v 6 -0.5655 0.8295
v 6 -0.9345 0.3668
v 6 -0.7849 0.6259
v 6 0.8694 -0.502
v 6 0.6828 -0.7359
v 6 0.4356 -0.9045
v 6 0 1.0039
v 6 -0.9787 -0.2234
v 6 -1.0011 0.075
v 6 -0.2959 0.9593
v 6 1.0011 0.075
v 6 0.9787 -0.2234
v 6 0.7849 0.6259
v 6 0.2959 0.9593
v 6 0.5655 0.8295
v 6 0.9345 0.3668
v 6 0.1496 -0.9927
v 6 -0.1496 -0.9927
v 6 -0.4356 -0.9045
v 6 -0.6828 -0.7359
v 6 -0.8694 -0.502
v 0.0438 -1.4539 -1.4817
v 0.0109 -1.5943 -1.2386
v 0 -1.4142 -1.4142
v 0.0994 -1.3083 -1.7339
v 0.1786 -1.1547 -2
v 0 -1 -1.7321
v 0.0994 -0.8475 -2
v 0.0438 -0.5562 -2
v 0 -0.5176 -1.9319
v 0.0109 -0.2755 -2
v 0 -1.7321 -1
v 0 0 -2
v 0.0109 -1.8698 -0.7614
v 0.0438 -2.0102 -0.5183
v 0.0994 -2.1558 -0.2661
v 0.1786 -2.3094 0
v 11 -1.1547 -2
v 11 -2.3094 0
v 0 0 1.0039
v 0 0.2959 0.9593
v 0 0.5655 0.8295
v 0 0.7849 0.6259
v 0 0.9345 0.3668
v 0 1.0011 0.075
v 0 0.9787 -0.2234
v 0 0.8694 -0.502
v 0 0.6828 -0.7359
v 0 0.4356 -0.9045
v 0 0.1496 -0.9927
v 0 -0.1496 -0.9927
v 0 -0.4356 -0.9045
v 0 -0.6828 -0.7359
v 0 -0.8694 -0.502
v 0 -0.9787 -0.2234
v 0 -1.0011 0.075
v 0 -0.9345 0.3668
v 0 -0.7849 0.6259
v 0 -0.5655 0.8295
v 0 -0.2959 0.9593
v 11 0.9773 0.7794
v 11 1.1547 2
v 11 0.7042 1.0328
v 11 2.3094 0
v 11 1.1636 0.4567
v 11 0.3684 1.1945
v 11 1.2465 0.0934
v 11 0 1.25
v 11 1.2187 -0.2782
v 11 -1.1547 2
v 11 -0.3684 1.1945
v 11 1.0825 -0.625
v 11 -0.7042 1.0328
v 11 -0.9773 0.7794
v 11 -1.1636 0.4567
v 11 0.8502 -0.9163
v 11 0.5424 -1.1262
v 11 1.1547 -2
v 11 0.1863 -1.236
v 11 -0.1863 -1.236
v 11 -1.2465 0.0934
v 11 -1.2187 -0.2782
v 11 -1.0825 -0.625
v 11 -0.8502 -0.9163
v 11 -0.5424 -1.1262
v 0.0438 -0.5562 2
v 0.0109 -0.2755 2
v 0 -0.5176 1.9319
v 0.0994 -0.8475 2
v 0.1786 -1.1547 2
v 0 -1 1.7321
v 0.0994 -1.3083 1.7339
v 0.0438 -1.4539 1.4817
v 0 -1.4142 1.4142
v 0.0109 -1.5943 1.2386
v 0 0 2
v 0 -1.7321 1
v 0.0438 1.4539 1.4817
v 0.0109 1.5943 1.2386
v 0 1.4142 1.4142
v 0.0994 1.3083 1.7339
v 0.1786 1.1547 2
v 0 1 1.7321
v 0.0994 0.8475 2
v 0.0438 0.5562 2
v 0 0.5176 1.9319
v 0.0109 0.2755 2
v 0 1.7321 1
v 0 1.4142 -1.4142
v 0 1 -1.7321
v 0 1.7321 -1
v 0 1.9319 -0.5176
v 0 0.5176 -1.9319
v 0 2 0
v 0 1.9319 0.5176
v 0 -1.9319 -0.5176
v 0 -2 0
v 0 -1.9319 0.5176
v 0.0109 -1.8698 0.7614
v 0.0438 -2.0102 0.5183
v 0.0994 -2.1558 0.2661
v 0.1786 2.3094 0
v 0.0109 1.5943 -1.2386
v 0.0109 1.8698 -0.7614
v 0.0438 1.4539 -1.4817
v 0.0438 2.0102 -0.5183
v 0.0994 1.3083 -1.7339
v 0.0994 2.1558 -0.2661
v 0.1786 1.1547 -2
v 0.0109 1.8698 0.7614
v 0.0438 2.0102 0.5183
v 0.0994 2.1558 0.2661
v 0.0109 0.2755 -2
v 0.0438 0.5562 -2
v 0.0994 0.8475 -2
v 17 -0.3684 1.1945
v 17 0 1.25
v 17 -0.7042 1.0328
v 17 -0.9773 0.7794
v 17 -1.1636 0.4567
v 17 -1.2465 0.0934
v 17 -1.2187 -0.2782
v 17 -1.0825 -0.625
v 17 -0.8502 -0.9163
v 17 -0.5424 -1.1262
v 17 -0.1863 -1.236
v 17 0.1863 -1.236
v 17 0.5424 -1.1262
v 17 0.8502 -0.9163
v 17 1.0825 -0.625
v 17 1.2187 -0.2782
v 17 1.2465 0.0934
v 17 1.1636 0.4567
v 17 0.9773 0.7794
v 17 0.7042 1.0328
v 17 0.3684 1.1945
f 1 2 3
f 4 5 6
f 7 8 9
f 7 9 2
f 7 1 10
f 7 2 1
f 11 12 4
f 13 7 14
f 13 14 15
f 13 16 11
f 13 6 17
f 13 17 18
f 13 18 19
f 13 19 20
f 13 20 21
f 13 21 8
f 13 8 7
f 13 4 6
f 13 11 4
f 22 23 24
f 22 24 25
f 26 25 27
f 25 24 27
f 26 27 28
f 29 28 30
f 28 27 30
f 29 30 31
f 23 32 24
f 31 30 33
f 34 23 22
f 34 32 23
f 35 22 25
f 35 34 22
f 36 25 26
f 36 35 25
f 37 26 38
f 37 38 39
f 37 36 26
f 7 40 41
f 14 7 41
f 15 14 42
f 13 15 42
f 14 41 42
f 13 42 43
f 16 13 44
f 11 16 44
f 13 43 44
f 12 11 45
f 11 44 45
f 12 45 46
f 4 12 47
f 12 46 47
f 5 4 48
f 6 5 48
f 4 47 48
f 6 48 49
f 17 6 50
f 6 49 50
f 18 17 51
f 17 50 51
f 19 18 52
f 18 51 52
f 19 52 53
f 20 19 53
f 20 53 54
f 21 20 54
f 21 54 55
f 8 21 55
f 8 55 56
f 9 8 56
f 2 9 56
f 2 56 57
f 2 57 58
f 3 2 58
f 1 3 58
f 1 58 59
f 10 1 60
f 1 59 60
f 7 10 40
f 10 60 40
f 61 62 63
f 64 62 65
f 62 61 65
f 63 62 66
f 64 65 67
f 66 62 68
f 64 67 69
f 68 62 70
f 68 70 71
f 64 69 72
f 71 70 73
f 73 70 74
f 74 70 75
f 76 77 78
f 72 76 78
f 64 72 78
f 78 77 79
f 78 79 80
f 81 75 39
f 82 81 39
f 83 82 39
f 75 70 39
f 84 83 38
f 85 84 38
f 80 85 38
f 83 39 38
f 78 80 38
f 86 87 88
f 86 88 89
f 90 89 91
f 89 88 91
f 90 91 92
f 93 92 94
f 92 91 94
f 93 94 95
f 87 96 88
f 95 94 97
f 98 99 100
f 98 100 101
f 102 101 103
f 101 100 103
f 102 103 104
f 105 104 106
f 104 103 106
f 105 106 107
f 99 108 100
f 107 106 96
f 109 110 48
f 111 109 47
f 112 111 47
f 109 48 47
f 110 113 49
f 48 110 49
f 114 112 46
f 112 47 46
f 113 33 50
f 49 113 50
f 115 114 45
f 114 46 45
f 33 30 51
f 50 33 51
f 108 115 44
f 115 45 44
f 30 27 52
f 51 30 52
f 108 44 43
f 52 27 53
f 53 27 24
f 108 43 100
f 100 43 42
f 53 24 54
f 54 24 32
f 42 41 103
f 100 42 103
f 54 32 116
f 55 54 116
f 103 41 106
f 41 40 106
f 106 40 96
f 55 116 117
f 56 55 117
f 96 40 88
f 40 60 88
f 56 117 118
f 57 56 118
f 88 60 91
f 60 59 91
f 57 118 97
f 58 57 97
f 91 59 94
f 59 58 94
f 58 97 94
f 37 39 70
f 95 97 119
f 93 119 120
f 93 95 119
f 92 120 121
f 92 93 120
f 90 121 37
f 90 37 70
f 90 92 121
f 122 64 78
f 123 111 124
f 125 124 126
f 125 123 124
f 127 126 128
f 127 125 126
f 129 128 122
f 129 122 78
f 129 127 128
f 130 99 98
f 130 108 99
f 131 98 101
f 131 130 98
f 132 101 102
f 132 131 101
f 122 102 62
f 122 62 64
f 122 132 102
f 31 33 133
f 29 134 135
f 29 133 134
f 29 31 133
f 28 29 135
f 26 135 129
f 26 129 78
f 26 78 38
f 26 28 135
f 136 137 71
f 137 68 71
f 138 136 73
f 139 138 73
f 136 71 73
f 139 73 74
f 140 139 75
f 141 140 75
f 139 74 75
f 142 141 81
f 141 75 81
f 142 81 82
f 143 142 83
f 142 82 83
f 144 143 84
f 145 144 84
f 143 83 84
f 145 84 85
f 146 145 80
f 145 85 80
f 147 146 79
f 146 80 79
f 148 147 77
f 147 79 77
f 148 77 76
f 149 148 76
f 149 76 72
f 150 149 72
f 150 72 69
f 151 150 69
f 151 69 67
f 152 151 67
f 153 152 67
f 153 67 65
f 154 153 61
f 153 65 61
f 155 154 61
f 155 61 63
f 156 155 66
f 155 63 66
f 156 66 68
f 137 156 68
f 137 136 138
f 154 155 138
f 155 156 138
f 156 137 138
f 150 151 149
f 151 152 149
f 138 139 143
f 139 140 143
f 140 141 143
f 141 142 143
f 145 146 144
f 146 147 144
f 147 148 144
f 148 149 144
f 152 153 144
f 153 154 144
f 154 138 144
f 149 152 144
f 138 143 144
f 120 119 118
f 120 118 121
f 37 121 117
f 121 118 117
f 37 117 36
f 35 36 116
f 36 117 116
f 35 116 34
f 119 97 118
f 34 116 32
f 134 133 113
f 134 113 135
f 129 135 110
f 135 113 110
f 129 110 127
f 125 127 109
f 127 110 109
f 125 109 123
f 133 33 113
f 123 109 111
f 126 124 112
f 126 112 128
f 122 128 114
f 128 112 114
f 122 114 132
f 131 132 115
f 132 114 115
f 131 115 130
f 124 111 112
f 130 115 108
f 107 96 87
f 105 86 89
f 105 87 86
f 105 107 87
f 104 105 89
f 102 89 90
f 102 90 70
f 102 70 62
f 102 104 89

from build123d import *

# Parameters (mm, degrees)
SKETCH2_R          = 2.33256351
HEX_DIE_DEPTH      = 11
SKETCH5_R          = 1.003913097
CUT_EXTRUDE1_DEPTH = 6


with BuildPart() as part:
    # BodySke → Base-Revolve (revolve)
    with BuildSketch(Plane.XY, mode=Mode.PRIVATE) as base_revolve_sk:
        Polygon((11, 1.25), (11, 2.309468822), (0.178671908, 2.309468822), (0, 2), (0, 0), (17, 0), (17, 1.25), align=None)
    revolve(base_revolve_sk.sketch.rotate(Axis((-25.4, 0, 0), (1, 0, 0)), 90), axis=Axis((-25.4, 0, 0), (1, 0, 0)))

    # Sketch2 → Hex-Die (cut)
    with BuildSketch(Plane(origin=(0, 0, 0), x_dir=(0, 0, -1), z_dir=(1, 0, 0))):
        Circle(SKETCH2_R)
        Polygon((-2, 1.154700543), (0, 2.309401087), (2, 1.154700543), (2, -1.154700543), (0, -2.309401087), (-2, -1.154700543), align=None, mode=Mode.SUBTRACT)
    extrude(amount=HEX_DIE_DEPTH, mode=Mode.SUBTRACT)

    # Sketch5 → Cut-Extrude1 (cut)
    with BuildSketch(Plane.ZY):
        Circle(SKETCH5_R)
    extrude(amount=-CUT_EXTRUDE1_DEPTH, mode=Mode.SUBTRACT)


solid = part.part
